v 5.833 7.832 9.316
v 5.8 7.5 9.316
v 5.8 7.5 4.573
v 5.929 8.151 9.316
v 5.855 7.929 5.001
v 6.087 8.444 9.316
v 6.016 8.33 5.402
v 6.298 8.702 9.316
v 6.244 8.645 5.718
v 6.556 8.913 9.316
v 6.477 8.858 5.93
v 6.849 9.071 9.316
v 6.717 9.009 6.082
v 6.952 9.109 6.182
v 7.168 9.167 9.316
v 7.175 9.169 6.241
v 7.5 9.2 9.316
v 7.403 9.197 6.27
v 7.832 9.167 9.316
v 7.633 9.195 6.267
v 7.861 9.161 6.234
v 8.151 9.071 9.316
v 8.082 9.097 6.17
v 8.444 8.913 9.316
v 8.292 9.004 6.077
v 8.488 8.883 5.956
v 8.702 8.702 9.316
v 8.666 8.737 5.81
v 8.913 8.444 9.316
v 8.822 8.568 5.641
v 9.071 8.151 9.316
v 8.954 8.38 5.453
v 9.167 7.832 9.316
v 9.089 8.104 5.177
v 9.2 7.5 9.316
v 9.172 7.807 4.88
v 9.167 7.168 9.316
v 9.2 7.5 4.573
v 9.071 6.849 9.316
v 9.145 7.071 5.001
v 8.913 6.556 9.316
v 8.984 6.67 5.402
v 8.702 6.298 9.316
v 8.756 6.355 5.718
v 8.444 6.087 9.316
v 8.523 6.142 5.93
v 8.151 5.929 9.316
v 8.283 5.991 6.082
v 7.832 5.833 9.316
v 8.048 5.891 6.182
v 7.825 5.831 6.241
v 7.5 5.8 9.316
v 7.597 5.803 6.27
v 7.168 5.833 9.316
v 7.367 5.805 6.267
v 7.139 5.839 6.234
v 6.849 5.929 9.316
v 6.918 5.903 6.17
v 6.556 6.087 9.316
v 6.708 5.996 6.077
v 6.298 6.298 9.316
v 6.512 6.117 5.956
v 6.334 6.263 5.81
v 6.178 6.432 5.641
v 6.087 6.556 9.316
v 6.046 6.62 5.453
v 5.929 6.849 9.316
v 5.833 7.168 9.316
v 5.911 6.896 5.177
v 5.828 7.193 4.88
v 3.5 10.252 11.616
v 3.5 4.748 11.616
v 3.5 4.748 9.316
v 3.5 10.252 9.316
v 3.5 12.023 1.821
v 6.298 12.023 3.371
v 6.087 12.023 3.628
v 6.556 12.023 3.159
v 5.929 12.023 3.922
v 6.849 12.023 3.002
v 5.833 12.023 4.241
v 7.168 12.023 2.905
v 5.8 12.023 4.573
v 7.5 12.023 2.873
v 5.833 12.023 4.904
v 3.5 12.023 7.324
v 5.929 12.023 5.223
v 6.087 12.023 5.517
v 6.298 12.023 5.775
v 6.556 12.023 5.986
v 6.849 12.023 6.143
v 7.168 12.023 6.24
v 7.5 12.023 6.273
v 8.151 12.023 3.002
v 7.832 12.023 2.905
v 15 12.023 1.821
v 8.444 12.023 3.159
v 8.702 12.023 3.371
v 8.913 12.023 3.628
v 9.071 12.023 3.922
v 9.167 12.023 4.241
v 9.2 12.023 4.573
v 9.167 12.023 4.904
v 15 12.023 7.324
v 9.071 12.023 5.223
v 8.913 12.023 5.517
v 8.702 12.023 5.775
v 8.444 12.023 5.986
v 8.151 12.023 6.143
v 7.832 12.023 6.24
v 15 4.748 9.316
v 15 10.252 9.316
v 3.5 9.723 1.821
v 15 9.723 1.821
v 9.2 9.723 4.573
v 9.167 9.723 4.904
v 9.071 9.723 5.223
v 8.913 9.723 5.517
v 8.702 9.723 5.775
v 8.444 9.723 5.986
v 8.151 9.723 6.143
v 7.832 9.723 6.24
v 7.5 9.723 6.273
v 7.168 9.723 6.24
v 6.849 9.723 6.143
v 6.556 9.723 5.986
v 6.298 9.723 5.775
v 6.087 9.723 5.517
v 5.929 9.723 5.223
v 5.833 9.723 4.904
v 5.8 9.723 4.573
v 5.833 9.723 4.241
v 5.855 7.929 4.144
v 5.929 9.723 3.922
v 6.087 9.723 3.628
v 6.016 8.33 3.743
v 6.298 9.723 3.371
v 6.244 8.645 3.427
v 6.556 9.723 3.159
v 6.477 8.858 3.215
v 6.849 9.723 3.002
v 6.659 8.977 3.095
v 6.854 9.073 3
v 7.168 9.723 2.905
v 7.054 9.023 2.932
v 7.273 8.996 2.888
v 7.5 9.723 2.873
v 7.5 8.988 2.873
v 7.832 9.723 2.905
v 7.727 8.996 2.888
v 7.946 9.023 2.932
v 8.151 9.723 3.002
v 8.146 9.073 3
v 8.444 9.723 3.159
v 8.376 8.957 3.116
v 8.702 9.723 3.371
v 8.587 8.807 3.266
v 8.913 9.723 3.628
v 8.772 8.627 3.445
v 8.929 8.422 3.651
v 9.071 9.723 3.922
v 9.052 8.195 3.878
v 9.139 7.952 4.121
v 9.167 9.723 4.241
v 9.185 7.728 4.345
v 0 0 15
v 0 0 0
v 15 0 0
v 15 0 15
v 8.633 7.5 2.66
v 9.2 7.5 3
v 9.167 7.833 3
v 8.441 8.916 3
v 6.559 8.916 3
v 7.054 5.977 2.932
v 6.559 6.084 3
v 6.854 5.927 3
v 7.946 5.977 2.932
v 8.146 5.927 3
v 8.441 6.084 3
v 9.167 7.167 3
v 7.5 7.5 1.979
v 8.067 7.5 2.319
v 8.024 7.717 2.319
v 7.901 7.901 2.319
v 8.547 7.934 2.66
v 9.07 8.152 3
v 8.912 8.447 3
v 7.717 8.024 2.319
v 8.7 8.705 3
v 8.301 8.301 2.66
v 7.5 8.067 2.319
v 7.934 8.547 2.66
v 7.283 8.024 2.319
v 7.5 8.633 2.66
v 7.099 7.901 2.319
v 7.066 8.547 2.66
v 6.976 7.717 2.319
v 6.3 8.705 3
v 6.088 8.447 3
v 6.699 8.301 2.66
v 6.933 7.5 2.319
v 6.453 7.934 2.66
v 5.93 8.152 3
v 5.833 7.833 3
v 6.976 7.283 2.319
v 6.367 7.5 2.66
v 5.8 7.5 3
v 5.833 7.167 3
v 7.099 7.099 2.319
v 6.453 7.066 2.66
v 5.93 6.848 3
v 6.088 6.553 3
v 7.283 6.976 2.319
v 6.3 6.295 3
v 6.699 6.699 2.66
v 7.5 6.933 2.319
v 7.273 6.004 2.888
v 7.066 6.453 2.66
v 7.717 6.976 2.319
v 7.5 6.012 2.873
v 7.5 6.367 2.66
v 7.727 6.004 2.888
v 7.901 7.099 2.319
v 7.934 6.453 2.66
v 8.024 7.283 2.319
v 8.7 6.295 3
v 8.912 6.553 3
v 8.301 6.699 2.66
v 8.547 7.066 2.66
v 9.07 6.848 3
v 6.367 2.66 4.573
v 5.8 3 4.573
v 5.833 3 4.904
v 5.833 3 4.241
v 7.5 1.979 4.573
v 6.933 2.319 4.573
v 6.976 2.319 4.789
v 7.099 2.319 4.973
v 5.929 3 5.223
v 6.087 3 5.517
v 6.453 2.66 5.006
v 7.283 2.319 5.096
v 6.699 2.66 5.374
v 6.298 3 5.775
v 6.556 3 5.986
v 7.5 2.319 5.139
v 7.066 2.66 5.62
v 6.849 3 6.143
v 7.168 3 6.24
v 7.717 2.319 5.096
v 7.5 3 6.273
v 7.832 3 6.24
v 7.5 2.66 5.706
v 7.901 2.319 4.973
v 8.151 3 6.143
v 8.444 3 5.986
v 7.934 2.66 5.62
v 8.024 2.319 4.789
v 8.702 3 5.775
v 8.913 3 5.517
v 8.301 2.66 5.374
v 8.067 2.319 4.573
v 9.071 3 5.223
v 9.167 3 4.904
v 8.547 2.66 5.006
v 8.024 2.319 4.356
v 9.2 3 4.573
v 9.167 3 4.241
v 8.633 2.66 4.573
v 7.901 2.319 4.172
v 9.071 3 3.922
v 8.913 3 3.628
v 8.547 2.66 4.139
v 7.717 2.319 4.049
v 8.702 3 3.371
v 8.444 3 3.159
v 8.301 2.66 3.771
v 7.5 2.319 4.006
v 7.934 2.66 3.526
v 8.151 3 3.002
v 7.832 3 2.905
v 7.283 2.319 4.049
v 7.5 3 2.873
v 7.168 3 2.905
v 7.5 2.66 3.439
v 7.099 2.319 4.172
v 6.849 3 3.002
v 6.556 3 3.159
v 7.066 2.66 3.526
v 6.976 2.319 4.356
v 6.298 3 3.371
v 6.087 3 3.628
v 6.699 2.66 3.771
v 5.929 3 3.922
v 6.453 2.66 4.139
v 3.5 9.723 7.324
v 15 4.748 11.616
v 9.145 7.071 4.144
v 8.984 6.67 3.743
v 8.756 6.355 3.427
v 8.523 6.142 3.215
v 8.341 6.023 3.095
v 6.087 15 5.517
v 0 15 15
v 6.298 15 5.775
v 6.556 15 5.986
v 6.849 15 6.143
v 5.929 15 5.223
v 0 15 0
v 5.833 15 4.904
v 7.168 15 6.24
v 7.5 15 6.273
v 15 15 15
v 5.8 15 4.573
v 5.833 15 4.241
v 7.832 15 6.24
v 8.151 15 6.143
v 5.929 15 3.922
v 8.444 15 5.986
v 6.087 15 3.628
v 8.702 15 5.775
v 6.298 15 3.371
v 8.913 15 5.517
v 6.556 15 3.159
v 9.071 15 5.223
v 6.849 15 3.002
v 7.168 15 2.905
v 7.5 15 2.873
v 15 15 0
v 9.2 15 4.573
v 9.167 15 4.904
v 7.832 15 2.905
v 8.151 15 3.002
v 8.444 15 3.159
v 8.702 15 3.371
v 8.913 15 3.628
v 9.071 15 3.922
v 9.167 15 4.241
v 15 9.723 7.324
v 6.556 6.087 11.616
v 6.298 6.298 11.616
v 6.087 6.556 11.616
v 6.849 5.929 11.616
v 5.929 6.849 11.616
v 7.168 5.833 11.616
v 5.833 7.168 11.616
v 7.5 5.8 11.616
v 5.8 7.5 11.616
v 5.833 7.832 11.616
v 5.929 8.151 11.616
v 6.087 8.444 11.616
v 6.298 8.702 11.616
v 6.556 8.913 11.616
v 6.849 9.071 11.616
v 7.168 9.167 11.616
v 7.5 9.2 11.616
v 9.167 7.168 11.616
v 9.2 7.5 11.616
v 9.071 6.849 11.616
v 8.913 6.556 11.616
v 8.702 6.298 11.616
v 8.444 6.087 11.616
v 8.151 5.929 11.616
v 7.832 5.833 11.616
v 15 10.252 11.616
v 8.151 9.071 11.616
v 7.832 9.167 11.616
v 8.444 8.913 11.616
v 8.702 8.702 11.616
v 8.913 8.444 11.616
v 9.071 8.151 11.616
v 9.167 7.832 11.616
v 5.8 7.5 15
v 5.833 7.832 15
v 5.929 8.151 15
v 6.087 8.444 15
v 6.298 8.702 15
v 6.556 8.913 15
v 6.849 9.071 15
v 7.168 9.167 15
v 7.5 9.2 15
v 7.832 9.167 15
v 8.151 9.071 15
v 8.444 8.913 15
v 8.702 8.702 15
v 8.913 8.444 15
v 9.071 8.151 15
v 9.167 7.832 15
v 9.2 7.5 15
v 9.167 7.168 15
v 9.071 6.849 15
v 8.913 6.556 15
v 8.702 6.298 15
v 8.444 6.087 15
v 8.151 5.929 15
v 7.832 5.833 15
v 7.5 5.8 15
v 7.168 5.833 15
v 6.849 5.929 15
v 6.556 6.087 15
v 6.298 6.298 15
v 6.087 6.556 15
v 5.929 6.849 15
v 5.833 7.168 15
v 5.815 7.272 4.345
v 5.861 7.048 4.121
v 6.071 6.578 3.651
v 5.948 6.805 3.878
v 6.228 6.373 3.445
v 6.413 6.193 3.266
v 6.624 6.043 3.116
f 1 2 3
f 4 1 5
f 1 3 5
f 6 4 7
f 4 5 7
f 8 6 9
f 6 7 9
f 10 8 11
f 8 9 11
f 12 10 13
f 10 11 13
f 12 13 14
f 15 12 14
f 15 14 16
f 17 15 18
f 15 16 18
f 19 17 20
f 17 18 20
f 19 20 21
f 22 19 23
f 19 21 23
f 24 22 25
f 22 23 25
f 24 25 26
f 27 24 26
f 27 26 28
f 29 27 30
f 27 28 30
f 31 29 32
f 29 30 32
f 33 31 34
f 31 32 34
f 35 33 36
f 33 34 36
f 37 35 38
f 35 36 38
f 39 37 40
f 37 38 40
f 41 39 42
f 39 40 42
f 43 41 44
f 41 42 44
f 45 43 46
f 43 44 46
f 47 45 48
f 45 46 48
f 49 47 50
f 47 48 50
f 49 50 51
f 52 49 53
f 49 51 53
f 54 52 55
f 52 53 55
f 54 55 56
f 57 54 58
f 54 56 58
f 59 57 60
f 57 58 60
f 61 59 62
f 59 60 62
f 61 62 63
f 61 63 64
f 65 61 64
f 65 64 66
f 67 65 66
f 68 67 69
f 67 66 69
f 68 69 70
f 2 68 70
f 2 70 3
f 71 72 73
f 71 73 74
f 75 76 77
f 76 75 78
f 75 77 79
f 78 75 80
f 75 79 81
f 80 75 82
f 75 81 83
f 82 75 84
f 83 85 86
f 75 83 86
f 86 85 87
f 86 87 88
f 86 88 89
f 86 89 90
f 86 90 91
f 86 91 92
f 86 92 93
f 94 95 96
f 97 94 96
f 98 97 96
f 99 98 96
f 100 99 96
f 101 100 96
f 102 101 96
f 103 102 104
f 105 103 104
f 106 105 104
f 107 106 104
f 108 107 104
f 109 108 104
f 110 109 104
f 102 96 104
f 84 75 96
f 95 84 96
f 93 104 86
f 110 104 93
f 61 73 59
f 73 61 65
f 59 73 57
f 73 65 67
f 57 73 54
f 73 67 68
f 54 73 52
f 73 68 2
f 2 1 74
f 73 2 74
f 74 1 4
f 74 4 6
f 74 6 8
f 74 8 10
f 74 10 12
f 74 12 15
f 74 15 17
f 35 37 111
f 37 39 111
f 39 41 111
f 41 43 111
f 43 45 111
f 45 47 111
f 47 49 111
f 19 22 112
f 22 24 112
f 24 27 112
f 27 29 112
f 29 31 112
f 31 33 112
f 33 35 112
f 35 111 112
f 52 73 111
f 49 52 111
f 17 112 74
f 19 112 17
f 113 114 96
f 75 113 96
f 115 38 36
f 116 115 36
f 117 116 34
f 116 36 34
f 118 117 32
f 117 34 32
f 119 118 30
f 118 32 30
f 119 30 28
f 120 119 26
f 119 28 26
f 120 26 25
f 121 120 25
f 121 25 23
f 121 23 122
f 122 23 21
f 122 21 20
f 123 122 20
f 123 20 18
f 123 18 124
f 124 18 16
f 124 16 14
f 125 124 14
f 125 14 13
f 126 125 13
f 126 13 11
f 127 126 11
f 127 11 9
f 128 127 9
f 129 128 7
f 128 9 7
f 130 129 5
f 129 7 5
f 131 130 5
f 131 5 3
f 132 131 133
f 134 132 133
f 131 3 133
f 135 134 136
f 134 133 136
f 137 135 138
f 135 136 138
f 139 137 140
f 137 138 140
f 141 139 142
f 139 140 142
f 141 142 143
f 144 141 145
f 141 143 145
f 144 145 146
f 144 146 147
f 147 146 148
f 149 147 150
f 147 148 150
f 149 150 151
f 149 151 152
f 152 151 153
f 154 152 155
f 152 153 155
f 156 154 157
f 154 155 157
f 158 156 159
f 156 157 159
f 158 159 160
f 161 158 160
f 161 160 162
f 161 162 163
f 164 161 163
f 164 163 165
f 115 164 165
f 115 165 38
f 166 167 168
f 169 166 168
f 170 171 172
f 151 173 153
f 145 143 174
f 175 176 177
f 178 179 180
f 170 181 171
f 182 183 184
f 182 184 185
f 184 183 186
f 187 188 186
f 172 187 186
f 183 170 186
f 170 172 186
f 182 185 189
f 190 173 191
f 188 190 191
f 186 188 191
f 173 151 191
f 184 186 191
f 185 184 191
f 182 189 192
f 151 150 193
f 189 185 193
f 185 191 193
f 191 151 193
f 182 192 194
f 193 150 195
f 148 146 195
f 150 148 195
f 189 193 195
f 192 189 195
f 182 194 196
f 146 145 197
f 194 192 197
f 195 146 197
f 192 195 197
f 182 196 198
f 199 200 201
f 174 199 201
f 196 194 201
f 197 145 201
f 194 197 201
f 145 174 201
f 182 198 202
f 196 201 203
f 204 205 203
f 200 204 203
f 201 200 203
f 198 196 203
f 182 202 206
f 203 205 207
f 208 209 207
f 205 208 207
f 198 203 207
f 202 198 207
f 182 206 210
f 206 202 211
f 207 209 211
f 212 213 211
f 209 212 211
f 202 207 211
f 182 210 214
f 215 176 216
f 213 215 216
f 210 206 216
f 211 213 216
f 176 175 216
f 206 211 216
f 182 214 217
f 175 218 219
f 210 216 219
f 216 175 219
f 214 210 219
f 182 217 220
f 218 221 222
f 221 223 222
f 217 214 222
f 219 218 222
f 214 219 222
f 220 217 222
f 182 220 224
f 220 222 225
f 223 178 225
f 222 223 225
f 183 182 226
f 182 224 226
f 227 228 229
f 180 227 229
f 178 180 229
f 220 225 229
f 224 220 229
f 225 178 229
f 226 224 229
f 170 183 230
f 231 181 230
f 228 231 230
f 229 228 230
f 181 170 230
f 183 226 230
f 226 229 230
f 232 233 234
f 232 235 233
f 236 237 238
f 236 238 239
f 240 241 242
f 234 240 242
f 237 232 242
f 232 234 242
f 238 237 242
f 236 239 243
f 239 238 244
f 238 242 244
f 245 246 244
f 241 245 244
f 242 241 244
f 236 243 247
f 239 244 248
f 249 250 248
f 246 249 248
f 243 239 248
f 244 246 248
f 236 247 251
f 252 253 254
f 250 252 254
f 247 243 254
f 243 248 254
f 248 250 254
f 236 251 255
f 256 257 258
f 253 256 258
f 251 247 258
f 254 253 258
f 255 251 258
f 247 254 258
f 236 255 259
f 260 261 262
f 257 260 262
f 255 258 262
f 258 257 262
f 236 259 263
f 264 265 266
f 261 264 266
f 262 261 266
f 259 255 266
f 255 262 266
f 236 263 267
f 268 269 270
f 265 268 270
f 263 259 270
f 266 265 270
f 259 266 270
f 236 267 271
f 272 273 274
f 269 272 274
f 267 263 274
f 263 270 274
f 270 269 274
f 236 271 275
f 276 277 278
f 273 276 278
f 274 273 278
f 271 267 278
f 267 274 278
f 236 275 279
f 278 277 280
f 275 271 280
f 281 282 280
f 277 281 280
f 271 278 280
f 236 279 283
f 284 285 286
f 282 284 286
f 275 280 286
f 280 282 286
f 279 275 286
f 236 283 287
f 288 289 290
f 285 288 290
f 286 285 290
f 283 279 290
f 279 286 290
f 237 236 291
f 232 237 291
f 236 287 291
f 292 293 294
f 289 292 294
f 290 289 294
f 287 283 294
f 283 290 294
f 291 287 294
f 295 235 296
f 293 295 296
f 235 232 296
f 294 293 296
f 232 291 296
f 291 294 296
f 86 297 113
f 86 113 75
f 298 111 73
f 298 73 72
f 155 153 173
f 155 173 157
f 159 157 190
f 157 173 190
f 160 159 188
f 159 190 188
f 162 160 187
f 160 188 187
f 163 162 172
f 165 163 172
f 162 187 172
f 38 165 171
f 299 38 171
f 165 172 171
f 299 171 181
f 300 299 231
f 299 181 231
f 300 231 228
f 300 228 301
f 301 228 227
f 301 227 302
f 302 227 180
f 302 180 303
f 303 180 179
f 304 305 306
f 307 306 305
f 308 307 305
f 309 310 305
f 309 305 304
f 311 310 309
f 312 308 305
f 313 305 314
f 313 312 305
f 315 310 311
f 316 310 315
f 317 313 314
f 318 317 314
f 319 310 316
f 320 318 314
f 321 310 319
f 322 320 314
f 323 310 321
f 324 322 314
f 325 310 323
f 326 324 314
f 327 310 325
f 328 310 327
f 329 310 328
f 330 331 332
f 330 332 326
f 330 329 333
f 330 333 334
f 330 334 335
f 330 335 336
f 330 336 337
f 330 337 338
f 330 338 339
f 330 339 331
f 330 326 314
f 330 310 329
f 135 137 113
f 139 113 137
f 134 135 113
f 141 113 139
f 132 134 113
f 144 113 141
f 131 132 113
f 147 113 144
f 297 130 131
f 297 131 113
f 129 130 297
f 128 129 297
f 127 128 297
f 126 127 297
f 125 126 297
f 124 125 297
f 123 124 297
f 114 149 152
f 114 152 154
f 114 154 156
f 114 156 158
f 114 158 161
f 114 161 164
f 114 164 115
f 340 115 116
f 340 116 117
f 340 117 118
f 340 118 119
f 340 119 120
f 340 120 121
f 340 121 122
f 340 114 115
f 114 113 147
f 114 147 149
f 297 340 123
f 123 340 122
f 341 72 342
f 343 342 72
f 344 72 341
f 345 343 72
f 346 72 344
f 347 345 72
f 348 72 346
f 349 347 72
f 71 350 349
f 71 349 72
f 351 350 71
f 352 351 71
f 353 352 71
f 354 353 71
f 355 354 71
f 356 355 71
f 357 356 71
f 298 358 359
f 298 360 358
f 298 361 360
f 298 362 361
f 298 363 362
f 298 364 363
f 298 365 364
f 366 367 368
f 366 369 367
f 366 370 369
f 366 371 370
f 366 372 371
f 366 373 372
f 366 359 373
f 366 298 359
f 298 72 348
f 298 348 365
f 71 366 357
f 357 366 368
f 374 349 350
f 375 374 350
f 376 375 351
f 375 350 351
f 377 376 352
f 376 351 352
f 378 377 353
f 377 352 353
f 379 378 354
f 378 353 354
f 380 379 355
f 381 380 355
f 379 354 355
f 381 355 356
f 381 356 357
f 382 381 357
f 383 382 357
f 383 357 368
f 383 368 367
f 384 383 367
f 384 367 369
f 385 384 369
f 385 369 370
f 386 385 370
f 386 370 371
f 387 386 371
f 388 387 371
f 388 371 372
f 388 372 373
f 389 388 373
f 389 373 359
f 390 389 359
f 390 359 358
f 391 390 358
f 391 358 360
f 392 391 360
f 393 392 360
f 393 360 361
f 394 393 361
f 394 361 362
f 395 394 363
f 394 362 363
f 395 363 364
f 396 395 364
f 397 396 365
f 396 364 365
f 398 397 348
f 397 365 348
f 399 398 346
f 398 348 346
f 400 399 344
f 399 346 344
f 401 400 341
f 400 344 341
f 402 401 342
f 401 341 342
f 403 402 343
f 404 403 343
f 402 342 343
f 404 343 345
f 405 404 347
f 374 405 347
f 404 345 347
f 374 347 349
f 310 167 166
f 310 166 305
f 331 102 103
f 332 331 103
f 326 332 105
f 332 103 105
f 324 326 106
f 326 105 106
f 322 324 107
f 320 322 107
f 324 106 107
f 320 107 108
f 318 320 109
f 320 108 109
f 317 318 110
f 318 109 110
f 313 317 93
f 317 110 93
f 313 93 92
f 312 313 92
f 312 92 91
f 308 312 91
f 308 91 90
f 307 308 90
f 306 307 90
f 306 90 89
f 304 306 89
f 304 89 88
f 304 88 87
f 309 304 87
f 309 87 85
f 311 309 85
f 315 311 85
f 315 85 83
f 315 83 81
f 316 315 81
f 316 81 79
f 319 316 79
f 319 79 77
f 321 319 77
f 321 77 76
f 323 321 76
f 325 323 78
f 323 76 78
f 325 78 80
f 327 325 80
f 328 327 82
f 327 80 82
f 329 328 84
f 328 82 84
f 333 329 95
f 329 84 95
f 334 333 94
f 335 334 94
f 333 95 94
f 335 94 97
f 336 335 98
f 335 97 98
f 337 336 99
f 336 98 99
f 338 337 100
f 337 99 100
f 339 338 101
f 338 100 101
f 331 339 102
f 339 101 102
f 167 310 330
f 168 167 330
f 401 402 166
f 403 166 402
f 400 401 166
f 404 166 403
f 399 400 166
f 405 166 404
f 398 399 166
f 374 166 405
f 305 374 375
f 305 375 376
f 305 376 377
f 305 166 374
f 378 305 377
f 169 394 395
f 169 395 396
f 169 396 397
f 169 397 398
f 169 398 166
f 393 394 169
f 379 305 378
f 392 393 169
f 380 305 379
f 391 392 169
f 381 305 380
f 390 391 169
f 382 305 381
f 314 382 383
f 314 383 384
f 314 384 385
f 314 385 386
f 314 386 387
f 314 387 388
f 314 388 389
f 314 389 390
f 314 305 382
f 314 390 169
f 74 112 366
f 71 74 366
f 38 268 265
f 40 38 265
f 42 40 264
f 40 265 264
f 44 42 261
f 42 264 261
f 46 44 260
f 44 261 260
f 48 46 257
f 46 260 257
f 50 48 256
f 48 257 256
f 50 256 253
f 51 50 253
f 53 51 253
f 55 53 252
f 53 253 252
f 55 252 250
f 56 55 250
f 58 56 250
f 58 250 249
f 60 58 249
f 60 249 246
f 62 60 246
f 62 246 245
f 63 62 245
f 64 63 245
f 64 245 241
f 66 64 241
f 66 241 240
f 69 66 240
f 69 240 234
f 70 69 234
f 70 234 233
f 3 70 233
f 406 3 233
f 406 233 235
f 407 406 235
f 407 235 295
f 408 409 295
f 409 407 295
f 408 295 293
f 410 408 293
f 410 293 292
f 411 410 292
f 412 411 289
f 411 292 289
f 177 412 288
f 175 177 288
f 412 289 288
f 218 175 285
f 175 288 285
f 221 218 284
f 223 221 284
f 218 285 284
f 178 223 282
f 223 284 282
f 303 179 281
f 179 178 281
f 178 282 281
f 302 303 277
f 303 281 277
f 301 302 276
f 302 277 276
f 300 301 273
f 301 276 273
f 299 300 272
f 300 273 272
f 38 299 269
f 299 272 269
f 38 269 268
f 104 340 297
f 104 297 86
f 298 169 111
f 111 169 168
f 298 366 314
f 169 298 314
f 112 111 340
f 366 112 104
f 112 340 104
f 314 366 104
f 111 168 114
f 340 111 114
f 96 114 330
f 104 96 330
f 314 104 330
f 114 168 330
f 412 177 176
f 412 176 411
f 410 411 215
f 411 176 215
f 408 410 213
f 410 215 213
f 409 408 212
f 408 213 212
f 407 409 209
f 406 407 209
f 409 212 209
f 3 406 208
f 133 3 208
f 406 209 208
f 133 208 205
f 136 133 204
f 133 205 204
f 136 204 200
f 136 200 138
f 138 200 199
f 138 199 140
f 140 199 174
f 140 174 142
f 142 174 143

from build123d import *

# Parameters (mm, degrees)
F0_W     = 15
F0_H     = 15
F1_DEPTH = 15
F2_W     = 5.503
F2_H     = 2.3
F2_W_2   = 2.3
F2_H_2   = 5.503
F3_DEPTH = 11.5
F5_D     = 3.4
F5_DEPTH = 12
F5_TIP   = 1.0214630523
F7_D     = 3.4
F7_DEPTH = 12
F7_TIP   = 1.0214630523


with BuildPart() as f1:
    # F0 (on Top) → F1 (new body)
    with BuildSketch(Plane.XY):
        with Locations((7.5, 7.5)):
            Rectangle(F0_W, F0_H)
    extrude(amount=F1_DEPTH)

    # F2 (on face) → F3 (cut)
    with BuildSketch(Plane.YZ.offset(15)):
        with Locations((7.5, 10.4661304504)):
            Rectangle(F2_W, F2_H)
        with Locations((10.8725838363, 4.5725819655)):
            Rectangle(F2_W_2, F2_H_2)
    extrude(amount=-F3_DEPTH, mode=Mode.SUBTRACT)

    # F5
    with Locations(Plane.XY.offset(15)):
        with Locations((7.5, 7.5)):
            Hole(F5_D / 2, depth=F5_DEPTH)
            with Locations((0, 0, -(F5_DEPTH + F5_TIP / 2))):  # 118° drill point
                Cone(0, F5_D / 2, F5_TIP, mode=Mode.SUBTRACT)

    # F7
    with Locations(Plane(origin=(0, 15, 0), x_dir=(-1, 0, 0), z_dir=(0, 1, 0))):
        with Locations((-7.5, 4.5725819655)):
            Hole(F7_D / 2, depth=F7_DEPTH)
            with Locations((0, 0, -(F7_DEPTH + F7_TIP / 2))):  # 118° drill point
                Cone(0, F7_D / 2, F7_TIP, mode=Mode.SUBTRACT)


solid = f1.part
